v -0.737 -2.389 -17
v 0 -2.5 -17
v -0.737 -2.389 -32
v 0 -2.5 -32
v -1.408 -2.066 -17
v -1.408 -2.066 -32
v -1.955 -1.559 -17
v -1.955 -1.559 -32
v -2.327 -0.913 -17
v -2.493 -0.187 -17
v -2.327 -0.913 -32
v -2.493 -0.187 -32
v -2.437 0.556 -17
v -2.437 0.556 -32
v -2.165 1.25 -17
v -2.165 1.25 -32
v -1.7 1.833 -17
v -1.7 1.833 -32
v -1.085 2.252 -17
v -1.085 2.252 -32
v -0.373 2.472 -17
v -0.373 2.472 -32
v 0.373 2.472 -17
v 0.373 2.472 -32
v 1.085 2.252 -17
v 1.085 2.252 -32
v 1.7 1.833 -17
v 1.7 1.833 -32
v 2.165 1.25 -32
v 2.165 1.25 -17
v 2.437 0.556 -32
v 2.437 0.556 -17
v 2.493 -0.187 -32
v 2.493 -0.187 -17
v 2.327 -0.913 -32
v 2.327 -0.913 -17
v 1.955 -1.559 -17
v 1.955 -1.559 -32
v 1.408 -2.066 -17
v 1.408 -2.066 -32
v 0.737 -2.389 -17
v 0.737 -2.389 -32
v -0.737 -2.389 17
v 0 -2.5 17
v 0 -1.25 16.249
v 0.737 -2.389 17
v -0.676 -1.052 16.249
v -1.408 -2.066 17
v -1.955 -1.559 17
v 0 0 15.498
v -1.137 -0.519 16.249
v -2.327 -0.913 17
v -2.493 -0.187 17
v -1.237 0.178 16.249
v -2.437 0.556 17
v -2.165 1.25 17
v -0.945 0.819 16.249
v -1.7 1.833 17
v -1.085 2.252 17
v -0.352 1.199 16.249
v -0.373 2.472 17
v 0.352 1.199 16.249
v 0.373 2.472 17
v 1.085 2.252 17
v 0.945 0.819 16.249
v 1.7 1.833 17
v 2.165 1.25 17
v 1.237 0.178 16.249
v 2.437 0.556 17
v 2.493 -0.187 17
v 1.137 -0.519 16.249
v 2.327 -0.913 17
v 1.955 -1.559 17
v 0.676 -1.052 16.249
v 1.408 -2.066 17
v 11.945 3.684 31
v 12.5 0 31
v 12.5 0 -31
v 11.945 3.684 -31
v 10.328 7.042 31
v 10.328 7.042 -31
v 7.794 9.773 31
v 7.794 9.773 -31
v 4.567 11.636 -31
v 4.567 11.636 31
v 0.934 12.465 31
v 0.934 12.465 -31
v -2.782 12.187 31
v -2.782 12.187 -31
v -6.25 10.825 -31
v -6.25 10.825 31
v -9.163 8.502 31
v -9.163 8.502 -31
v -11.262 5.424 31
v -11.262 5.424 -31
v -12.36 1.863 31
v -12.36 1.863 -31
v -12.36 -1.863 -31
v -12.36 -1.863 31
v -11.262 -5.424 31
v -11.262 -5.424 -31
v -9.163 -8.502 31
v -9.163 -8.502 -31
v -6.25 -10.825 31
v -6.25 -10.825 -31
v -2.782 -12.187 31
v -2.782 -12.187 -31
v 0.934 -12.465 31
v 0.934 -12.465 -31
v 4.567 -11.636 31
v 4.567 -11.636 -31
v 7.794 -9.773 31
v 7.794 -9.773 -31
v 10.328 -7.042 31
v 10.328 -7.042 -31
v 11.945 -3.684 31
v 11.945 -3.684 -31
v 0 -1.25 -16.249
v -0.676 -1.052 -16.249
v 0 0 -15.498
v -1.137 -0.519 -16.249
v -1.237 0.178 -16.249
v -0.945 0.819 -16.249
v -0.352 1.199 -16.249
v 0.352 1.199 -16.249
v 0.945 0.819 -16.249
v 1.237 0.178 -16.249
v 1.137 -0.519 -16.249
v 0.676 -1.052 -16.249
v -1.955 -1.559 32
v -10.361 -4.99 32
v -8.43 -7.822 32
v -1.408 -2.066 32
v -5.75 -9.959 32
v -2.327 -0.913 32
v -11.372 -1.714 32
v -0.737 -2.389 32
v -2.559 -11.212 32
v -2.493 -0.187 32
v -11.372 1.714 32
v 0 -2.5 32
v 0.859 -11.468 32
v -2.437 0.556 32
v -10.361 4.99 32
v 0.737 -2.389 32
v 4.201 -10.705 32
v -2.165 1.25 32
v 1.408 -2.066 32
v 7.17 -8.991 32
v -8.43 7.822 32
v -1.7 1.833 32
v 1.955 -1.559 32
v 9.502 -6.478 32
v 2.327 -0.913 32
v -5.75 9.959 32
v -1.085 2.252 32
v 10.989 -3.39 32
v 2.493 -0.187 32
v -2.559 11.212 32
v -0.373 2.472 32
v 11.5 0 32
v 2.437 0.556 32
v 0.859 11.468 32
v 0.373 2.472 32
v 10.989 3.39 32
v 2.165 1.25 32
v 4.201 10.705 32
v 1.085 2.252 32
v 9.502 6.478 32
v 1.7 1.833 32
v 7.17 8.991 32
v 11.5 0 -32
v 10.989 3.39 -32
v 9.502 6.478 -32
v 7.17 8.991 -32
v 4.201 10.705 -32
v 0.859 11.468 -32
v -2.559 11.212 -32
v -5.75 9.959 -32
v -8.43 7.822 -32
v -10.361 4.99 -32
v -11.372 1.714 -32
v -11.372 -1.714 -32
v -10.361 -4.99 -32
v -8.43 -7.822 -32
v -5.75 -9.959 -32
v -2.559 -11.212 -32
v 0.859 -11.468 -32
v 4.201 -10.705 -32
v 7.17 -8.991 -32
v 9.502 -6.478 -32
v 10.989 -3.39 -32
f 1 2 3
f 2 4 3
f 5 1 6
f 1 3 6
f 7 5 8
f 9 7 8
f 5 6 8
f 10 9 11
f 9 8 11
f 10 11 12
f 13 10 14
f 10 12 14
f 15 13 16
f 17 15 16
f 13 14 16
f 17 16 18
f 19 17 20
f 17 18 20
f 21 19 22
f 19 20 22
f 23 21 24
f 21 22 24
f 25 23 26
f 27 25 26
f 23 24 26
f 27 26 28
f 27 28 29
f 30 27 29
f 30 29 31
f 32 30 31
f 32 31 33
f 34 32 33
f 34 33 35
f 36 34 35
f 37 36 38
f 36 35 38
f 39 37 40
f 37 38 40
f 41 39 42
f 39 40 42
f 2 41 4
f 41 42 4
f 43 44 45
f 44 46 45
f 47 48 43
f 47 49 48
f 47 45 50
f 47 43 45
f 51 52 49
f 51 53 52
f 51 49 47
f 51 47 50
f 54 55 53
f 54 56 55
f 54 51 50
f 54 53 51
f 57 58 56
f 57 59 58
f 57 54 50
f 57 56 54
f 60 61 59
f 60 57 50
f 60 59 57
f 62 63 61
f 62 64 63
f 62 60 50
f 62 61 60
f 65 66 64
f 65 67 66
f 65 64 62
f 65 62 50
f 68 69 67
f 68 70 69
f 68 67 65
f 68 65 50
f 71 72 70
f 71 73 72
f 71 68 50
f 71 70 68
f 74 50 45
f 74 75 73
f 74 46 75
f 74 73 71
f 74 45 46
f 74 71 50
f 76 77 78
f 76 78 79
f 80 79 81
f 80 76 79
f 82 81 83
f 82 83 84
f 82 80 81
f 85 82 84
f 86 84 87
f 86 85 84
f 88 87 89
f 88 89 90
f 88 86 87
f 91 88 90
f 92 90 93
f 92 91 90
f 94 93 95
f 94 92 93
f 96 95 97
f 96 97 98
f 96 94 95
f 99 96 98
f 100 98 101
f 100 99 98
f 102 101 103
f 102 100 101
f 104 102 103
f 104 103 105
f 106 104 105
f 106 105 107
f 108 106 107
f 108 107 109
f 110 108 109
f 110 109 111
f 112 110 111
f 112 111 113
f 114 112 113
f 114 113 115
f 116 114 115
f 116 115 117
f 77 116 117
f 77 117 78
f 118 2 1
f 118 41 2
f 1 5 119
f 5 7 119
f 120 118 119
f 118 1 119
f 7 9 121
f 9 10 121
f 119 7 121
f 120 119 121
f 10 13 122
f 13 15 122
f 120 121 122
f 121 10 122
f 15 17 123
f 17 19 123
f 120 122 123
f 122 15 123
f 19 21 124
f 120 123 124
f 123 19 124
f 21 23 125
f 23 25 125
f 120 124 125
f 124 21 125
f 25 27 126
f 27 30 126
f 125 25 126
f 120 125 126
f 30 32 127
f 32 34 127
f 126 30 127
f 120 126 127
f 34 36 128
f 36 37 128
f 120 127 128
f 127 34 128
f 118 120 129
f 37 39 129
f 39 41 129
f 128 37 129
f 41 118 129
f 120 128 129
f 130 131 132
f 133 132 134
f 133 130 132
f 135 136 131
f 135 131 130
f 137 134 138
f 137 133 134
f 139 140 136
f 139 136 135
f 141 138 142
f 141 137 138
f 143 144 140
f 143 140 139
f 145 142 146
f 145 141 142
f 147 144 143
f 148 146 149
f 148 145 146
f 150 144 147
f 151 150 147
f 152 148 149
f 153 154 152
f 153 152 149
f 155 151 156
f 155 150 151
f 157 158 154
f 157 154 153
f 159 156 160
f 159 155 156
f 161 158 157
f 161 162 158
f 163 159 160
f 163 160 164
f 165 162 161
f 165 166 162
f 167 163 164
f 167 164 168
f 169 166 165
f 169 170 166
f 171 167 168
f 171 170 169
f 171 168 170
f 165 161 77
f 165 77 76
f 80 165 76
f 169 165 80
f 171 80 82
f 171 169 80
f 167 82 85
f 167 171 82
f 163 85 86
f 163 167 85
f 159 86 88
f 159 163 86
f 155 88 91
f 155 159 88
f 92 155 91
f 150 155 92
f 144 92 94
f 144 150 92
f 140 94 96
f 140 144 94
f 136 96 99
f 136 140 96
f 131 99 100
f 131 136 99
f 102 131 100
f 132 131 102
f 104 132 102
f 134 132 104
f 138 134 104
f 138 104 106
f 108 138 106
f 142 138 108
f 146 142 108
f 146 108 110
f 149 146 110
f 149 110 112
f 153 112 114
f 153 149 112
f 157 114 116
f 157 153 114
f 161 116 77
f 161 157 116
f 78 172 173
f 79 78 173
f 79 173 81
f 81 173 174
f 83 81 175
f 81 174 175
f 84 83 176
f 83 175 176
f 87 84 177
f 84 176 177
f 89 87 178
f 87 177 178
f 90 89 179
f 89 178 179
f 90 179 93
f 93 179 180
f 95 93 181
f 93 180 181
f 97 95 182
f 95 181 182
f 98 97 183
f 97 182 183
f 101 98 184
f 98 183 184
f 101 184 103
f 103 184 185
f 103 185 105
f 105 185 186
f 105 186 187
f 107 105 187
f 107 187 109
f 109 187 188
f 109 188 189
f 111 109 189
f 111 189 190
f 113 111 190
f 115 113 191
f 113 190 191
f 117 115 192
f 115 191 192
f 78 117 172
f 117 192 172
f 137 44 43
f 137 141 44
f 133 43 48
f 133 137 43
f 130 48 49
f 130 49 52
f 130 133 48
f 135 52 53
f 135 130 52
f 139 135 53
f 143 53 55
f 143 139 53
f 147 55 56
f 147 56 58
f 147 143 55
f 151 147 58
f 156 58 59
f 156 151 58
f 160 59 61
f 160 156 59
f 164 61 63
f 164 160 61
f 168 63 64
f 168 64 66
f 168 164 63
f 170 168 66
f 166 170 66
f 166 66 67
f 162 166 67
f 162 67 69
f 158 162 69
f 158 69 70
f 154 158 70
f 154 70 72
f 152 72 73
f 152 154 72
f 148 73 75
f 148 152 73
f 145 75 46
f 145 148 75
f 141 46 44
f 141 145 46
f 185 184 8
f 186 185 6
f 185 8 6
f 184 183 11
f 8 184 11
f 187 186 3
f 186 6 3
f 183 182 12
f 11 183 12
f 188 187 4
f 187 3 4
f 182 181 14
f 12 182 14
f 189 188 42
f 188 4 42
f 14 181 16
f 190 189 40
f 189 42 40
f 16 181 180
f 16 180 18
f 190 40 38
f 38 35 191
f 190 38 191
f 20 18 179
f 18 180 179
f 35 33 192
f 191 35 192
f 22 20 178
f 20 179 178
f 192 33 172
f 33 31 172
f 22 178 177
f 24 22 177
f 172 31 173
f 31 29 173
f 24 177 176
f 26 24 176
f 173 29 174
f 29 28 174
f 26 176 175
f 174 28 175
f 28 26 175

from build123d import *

# Parameters (mm, degrees)
SKETCH1_R           = 12.5
BOSS_EXTRUDE1_DEPTH = 32
CHAMFER1_SIZE       = 1


with BuildPart() as part:
    # Sketch1 → Boss-Extrude1 (new body, symmetric)
    with BuildSketch(Plane.XY):
        Circle(SKETCH1_R)
    extrude(amount=BOSS_EXTRUDE1_DEPTH, both=True)

    # Chamfer1
    chamfer1_edges = [part.edges().sort_by_distance(p)[0] for p in [
        (-12.5, 0, -32),
        (-12.5, 0, 32),
    ]]
    chamfer(chamfer1_edges, length=CHAMFER1_SIZE)

    # Sketch4 → M6 Tapped Hole1 (revolve, cut)
    with BuildSketch(Plane(origin=(0, 0, 32), x_dir=(0, -1, 0), z_dir=(1, 0, 0))):
        Polygon((0, 0), (0, 16.502151548), (2.5, 15), (2.5, 0), align=None)
    m6_tapped_hole1 = revolve(axis=Axis((0, 0, 38.35), (0, 0, -1)), mode=Mode.SUBTRACT)

    # Mirror1: M6 Tapped Hole1 across plane
    add(m6_tapped_hole1.mirror(Plane.XY), mode=Mode.SUBTRACT)


solid = part.part
